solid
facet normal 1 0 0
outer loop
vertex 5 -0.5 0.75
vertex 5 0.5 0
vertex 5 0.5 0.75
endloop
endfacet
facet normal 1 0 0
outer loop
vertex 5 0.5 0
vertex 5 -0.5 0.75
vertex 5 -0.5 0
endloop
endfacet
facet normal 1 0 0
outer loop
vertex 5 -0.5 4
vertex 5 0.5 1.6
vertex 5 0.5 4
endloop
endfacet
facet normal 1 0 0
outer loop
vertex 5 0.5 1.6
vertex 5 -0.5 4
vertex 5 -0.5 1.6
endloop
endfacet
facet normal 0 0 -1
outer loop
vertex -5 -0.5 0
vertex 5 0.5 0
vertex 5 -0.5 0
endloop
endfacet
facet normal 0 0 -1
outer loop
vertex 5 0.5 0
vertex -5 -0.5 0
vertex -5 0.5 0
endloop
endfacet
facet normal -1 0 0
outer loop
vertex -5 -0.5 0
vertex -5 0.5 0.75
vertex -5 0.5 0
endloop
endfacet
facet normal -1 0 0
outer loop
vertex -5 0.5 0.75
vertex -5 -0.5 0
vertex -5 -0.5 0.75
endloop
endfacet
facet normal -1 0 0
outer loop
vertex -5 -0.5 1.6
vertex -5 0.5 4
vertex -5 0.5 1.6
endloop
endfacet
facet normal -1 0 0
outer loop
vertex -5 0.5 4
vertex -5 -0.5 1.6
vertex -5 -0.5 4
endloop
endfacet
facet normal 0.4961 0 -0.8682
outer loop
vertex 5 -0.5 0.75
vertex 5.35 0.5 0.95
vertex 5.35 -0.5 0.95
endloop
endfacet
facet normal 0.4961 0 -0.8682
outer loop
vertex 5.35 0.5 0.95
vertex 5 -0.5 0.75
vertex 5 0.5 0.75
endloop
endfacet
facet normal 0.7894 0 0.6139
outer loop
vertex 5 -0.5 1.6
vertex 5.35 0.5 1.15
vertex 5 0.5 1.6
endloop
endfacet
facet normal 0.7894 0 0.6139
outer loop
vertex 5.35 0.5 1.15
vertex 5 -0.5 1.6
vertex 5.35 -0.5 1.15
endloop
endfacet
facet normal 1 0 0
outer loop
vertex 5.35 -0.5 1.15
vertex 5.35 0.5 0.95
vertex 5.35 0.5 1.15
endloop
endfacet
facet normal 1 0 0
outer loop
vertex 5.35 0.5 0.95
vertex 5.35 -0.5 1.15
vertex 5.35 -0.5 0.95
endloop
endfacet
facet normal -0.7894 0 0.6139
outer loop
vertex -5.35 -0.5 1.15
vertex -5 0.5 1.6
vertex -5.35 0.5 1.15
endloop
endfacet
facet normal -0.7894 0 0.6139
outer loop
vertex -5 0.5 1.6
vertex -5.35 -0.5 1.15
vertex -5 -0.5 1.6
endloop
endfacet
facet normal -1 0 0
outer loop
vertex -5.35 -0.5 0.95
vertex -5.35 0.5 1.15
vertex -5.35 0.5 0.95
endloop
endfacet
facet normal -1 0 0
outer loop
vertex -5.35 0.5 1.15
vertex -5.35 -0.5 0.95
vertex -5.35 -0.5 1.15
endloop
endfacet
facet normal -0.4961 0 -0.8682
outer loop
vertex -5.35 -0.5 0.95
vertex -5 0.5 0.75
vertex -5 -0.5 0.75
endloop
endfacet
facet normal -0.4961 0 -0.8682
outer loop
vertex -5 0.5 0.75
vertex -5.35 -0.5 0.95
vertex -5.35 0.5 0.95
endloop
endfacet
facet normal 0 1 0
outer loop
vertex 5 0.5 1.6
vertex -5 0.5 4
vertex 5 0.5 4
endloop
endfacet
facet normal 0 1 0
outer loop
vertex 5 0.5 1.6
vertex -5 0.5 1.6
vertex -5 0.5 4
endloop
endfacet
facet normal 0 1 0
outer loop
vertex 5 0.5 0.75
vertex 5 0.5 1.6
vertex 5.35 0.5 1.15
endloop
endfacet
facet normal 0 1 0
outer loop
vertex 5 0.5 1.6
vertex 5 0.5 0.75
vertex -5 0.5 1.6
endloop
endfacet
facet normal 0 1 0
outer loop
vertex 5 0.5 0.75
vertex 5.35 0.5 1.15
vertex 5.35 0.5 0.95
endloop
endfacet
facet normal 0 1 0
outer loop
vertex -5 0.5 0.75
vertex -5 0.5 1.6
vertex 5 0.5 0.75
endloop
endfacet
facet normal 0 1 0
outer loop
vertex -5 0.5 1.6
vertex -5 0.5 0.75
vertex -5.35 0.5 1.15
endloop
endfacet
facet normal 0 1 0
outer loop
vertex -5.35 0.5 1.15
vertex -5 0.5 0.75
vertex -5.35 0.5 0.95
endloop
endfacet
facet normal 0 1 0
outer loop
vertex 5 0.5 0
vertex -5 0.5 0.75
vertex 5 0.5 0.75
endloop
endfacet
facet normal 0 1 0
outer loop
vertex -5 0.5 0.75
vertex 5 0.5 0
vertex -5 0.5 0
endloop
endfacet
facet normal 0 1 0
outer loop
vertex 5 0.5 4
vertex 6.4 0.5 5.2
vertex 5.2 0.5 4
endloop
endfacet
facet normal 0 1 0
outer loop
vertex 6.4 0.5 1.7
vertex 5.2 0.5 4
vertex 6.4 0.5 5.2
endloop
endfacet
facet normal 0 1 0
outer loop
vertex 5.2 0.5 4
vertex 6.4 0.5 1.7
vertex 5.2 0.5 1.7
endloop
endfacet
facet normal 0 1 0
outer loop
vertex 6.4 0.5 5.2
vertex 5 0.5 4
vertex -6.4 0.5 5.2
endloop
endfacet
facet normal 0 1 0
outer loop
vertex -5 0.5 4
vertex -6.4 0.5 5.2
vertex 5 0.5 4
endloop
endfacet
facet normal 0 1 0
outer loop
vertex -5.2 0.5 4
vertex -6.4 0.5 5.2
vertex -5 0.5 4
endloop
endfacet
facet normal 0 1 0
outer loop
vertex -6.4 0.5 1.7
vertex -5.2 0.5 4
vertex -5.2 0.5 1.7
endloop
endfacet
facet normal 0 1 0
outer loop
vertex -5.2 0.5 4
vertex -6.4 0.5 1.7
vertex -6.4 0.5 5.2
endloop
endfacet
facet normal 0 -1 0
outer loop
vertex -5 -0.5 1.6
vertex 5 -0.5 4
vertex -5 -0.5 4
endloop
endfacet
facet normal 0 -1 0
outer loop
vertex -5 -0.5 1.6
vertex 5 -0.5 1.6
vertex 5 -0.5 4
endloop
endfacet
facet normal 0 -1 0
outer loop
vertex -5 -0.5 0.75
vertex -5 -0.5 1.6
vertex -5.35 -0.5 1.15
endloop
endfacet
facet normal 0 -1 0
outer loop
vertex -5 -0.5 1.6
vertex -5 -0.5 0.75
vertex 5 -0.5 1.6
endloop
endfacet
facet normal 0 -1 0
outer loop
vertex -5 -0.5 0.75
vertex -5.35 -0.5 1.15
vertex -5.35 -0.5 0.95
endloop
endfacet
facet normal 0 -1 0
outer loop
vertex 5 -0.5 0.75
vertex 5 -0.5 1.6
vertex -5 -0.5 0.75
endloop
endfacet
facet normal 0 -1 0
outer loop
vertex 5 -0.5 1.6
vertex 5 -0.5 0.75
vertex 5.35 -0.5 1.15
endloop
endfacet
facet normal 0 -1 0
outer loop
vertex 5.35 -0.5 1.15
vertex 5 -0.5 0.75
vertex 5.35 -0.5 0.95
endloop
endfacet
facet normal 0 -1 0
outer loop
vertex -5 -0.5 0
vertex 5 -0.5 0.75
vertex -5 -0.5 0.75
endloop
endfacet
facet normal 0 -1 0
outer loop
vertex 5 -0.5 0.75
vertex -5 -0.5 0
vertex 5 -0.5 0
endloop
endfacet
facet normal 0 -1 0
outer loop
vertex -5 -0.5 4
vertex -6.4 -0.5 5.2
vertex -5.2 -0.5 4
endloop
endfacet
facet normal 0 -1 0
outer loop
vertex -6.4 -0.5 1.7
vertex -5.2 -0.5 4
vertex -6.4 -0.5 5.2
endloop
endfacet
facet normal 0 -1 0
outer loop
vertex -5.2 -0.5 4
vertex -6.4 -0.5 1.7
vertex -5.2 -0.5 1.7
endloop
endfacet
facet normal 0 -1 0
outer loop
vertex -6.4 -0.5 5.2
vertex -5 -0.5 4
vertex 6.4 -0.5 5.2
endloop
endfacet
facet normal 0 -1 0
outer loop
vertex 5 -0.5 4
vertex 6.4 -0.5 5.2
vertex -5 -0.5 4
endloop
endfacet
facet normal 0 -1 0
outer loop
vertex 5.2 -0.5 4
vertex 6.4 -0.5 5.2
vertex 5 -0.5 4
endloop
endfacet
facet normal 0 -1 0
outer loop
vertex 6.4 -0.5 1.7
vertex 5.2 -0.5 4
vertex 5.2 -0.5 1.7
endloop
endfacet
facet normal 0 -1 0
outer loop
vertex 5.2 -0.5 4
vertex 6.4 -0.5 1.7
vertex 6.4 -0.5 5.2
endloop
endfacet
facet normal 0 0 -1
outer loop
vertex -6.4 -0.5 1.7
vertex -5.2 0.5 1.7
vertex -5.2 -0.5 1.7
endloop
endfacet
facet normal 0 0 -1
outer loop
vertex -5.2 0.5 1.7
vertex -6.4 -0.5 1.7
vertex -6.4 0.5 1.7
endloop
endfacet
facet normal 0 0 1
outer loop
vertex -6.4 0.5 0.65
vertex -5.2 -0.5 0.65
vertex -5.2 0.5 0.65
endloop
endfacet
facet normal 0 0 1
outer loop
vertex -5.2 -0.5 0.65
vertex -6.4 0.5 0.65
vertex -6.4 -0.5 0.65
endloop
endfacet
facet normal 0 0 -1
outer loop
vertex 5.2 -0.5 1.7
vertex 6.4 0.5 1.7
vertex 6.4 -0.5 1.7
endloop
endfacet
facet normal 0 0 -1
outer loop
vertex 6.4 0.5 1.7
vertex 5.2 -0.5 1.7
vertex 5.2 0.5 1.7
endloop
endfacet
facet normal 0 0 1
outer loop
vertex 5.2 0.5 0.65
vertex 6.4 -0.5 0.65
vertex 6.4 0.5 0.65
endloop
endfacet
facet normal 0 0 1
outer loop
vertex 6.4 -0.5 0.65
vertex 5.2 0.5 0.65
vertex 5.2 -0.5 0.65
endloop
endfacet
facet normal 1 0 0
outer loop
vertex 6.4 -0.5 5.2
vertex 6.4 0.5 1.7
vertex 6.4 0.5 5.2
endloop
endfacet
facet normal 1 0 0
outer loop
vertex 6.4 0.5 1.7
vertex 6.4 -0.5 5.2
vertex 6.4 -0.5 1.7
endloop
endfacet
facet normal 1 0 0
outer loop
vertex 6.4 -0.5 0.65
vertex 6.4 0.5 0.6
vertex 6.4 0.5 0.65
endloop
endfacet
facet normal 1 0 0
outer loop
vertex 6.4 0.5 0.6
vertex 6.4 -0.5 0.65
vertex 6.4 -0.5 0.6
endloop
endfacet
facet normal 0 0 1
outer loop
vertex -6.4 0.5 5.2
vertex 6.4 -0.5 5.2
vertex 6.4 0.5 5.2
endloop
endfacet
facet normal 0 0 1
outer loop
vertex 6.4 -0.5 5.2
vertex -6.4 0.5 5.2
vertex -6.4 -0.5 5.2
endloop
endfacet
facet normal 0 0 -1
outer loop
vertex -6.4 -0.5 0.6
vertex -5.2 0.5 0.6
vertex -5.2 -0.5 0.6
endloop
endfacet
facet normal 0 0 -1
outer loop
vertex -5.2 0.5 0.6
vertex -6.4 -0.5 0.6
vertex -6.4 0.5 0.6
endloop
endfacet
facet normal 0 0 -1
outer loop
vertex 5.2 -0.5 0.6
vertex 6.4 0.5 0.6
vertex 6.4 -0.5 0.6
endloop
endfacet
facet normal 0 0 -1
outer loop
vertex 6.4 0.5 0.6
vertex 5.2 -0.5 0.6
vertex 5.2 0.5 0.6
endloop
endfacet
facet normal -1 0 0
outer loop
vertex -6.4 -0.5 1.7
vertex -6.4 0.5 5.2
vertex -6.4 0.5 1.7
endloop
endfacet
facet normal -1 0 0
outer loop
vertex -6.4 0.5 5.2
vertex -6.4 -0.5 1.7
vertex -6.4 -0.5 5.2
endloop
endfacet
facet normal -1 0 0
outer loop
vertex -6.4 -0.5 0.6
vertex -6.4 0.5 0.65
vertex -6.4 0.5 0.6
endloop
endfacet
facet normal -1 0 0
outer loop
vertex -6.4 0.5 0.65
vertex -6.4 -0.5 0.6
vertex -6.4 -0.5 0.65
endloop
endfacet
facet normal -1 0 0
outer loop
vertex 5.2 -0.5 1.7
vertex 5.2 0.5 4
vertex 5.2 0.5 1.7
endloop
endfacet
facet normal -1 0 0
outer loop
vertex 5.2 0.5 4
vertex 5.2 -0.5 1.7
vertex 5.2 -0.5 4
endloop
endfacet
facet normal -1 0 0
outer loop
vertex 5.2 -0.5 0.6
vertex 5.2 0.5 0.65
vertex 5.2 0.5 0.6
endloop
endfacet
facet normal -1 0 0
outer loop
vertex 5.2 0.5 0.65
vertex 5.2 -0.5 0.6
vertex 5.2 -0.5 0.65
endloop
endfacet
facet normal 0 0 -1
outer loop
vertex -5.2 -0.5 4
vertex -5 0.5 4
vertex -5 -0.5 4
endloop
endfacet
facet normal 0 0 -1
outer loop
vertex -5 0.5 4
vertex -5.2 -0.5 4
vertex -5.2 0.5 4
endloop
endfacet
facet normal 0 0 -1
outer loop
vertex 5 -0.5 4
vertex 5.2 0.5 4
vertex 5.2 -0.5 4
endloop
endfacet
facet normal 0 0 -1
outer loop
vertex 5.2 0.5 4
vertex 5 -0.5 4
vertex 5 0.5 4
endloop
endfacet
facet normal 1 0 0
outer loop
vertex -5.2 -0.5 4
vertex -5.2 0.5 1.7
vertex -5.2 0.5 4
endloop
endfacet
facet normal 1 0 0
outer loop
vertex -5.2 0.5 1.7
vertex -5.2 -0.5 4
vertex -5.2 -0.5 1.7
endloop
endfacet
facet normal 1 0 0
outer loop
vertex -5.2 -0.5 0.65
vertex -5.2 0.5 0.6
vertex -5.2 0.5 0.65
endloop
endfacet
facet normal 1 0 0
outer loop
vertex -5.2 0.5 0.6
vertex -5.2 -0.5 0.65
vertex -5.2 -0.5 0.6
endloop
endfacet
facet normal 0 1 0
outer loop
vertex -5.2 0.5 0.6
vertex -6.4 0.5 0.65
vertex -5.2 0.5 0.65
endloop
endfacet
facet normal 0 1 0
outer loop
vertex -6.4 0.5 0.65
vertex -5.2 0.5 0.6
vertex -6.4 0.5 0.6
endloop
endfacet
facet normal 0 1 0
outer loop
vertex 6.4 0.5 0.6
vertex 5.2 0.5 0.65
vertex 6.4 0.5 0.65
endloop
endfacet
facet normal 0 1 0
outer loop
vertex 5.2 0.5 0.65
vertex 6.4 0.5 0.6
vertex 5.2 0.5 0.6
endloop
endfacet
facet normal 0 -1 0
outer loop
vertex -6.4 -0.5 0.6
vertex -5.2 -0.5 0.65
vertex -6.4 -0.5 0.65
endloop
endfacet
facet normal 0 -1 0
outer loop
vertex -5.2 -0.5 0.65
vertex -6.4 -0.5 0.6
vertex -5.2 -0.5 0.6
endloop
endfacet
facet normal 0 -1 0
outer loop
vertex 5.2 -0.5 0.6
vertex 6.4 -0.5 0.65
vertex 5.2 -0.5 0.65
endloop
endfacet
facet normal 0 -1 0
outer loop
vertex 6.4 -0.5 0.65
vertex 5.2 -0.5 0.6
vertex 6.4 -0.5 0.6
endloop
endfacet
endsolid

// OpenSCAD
// file: ../lib/at01_inverted_core_snap.scad
// File: at01_inverted_core_snap.scad
// AT-01 — experiment-owned inverted fixed-core / removable-shell snap.
//
// This geometry does not copy the QuackWorks/OpenGrid snap. It keeps only the
// high-level design lessons: compact fixed side, removable compliant side,
// explicit locating/retention roles, and a Lite-like 4.0 / 3.4 mm Z baseline.

// Fixed-side baseline.
AT01_CORE_SIZE = 10.0;
AT01_CORE_HEIGHT = 4.0;
AT01_ROOT_SHOULDER = 0.6;
AT01_ENGAGEMENT_HEIGHT = 3.4;

// Removable shell.
AT01_CLEARANCE = 0.20;              // per side on nominal 10 x 10 core
AT01_SHELL_WALL = 1.20;
AT01_SHELL_TOP = 1.20;
AT01_SHELL_INNER = AT01_CORE_SIZE + 2 * AT01_CLEARANCE;
AT01_SHELL_OUTER = AT01_SHELL_INNER + 2 * AT01_SHELL_WALL;
AT01_SHELL_HEIGHT = AT01_ENGAGEMENT_HEIGHT + AT01_SHELL_TOP;

// Two-sided retention on +/-X.
AT01_RIB_PROTRUSION = 0.35;
AT01_RIB_WIDTH = 4.0;
AT01_RIB_Z_BOTTOM = 0.75;
AT01_RIB_Z_LOWER_MAX = 0.95;
AT01_RIB_Z_UPPER_MAX = 1.15;
AT01_RIB_Z_TOP = 1.60;

// Receiving window in each compliant shell tongue.
// Values are shell-local; assembled shell starts at Z=AT01_ROOT_SHOULDER.
AT01_WINDOW_WIDTH = 4.8;
AT01_WINDOW_Z_MIN = 0.05;
AT01_WINDOW_Z_MAX = 1.10;

// Two relief slots isolate the center tongue on each +/-X wall.
AT01_FLEX_SLOT_Y = 3.0;
AT01_FLEX_SLOT_WIDTH = 0.8;

// Evidence helpers.
AT01_EXPLODED_Z = 8.0;
AT01_PROFILE_SLICE = 1.0;

assert(
    abs(AT01_ROOT_SHOULDER + AT01_ENGAGEMENT_HEIGHT - AT01_CORE_HEIGHT) < 0.0001,
    "AT-01 Lite baseline must satisfy shoulder + engagement = 4.0 mm."
);
assert(
    abs(AT01_SHELL_INNER - (AT01_CORE_SIZE + 2 * AT01_CLEARANCE)) < 0.0001,
    "AT-01 shell inner size must preserve the stated side clearance."
);

module _at01_positive_x_retention_rib() {
    // Polygon is defined in X/Z and extruded along Y.
    rotate([90, 0, 0])
        linear_extrude(height = AT01_RIB_WIDTH, center = true, convexity = 10)
            polygon(points = [
                [AT01_CORE_SIZE / 2, AT01_RIB_Z_BOTTOM],
                [AT01_CORE_SIZE / 2 + AT01_RIB_PROTRUSION, AT01_RIB_Z_LOWER_MAX],
                [AT01_CORE_SIZE / 2 + AT01_RIB_PROTRUSION, AT01_RIB_Z_UPPER_MAX],
                [AT01_CORE_SIZE / 2, AT01_RIB_Z_TOP]
            ]);
}

module at01_fixed_core() {
    union() {
        translate([-AT01_CORE_SIZE / 2, -AT01_CORE_SIZE / 2, 0])
            cube([AT01_CORE_SIZE, AT01_CORE_SIZE, AT01_CORE_HEIGHT]);

        _at01_positive_x_retention_rib();

        mirror([1, 0, 0])
            _at01_positive_x_retention_rib();
    }
}

module _at01_shell_outer() {
    translate([-AT01_SHELL_OUTER / 2, -AT01_SHELL_OUTER / 2, 0])
        cube([AT01_SHELL_OUTER, AT01_SHELL_OUTER, AT01_SHELL_HEIGHT]);
}

module _at01_shell_cavity() {
    // Ends exactly at the underside of the top plate.
    translate([-AT01_SHELL_INNER / 2, -AT01_SHELL_INNER / 2, -0.05])
        cube([AT01_SHELL_INNER, AT01_SHELL_INNER, AT01_ENGAGEMENT_HEIGHT + 0.05]);
}

module _at01_retention_window(x_sign = 1) {
    wall_center = (AT01_SHELL_INNER / 2 + AT01_SHELL_OUTER / 2) / 2;
    translate([
        x_sign * wall_center,
        0,
        (AT01_WINDOW_Z_MIN + AT01_WINDOW_Z_MAX) / 2
    ])
        cube([
            AT01_SHELL_WALL + 0.4,
            AT01_WINDOW_WIDTH,
            AT01_WINDOW_Z_MAX - AT01_WINDOW_Z_MIN
        ], center = true);
}

module _at01_flex_slot(x_sign = 1, y_sign = 1) {
    wall_center = (AT01_SHELL_INNER / 2 + AT01_SHELL_OUTER / 2) / 2;
    translate([
        x_sign * wall_center,
        y_sign * AT01_FLEX_SLOT_Y,
        AT01_ENGAGEMENT_HEIGHT / 2
    ])
        cube([
            AT01_SHELL_WALL + 0.4,
            AT01_FLEX_SLOT_WIDTH,
            AT01_ENGAGEMENT_HEIGHT + 0.10
        ], center = true);
}

module at01_removable_shell() {
    difference() {
        _at01_shell_outer();
        _at01_shell_cavity();

        for (x_sign = [-1, 1]) {
            _at01_retention_window(x_sign);

            for (y_sign = [-1, 1])
                _at01_flex_slot(x_sign, y_sign);
        }
    }
}

module at01_assembled(shell_alpha = 0.55) {
    color([0.68, 0.70, 0.74])
        at01_fixed_core();

    translate([0, 0, AT01_ROOT_SHOULDER])
        color([0.92, 0.30, 0.12, shell_alpha])
            at01_removable_shell();
}

module at01_exploded() {
    color([0.68, 0.70, 0.74])
        at01_fixed_core();

    translate([0, 0, AT01_ROOT_SHOULDER + AT01_EXPLODED_Z])
        color([0.92, 0.30, 0.12])
            at01_removable_shell();
}

module _at01_retention_slice_volume() {
    translate([-20, -AT01_PROFILE_SLICE / 2, -1])
        cube([40, AT01_PROFILE_SLICE, 12]);
}

module _at01_locating_slice_volume() {
    translate([-AT01_PROFILE_SLICE / 2, -20, -1])
        cube([AT01_PROFILE_SLICE, 40, 12]);
}

module at01_fixed_retention_profile() {
    intersection() {
        at01_fixed_core();
        _at01_retention_slice_volume();
    }
}

module at01_shell_retention_profile() {
    intersection() {
        at01_removable_shell();
        translate([0, 0, -AT01_ROOT_SHOULDER])
            _at01_retention_slice_volume();
    }
}

module at01_fixed_locating_profile() {
    intersection() {
        at01_fixed_core();
        _at01_locating_slice_volume();
    }
}

module at01_shell_locating_profile() {
    intersection() {
        at01_removable_shell();
        translate([0, 0, -AT01_ROOT_SHOULDER])
            _at01_locating_slice_volume();
    }
}

module at01_retention_section() {
    color([0.68, 0.70, 0.74])
        at01_fixed_retention_profile();

    translate([0, 0, AT01_ROOT_SHOULDER])
        color([0.92, 0.30, 0.12])
            at01_shell_retention_profile();
}

module at01_locating_section() {
    color([0.68, 0.70, 0.74])
        at01_fixed_locating_profile();

    translate([0, 0, AT01_ROOT_SHOULDER])
        color([0.92, 0.30, 0.12])
            at01_shell_locating_profile();
}
// main file
include <../lib/at01_inverted_core_snap.scad>
$vpt=[0,0,2.6]; $vpr=[90,0,0]; $vpd=44;
at01_retention_section();
